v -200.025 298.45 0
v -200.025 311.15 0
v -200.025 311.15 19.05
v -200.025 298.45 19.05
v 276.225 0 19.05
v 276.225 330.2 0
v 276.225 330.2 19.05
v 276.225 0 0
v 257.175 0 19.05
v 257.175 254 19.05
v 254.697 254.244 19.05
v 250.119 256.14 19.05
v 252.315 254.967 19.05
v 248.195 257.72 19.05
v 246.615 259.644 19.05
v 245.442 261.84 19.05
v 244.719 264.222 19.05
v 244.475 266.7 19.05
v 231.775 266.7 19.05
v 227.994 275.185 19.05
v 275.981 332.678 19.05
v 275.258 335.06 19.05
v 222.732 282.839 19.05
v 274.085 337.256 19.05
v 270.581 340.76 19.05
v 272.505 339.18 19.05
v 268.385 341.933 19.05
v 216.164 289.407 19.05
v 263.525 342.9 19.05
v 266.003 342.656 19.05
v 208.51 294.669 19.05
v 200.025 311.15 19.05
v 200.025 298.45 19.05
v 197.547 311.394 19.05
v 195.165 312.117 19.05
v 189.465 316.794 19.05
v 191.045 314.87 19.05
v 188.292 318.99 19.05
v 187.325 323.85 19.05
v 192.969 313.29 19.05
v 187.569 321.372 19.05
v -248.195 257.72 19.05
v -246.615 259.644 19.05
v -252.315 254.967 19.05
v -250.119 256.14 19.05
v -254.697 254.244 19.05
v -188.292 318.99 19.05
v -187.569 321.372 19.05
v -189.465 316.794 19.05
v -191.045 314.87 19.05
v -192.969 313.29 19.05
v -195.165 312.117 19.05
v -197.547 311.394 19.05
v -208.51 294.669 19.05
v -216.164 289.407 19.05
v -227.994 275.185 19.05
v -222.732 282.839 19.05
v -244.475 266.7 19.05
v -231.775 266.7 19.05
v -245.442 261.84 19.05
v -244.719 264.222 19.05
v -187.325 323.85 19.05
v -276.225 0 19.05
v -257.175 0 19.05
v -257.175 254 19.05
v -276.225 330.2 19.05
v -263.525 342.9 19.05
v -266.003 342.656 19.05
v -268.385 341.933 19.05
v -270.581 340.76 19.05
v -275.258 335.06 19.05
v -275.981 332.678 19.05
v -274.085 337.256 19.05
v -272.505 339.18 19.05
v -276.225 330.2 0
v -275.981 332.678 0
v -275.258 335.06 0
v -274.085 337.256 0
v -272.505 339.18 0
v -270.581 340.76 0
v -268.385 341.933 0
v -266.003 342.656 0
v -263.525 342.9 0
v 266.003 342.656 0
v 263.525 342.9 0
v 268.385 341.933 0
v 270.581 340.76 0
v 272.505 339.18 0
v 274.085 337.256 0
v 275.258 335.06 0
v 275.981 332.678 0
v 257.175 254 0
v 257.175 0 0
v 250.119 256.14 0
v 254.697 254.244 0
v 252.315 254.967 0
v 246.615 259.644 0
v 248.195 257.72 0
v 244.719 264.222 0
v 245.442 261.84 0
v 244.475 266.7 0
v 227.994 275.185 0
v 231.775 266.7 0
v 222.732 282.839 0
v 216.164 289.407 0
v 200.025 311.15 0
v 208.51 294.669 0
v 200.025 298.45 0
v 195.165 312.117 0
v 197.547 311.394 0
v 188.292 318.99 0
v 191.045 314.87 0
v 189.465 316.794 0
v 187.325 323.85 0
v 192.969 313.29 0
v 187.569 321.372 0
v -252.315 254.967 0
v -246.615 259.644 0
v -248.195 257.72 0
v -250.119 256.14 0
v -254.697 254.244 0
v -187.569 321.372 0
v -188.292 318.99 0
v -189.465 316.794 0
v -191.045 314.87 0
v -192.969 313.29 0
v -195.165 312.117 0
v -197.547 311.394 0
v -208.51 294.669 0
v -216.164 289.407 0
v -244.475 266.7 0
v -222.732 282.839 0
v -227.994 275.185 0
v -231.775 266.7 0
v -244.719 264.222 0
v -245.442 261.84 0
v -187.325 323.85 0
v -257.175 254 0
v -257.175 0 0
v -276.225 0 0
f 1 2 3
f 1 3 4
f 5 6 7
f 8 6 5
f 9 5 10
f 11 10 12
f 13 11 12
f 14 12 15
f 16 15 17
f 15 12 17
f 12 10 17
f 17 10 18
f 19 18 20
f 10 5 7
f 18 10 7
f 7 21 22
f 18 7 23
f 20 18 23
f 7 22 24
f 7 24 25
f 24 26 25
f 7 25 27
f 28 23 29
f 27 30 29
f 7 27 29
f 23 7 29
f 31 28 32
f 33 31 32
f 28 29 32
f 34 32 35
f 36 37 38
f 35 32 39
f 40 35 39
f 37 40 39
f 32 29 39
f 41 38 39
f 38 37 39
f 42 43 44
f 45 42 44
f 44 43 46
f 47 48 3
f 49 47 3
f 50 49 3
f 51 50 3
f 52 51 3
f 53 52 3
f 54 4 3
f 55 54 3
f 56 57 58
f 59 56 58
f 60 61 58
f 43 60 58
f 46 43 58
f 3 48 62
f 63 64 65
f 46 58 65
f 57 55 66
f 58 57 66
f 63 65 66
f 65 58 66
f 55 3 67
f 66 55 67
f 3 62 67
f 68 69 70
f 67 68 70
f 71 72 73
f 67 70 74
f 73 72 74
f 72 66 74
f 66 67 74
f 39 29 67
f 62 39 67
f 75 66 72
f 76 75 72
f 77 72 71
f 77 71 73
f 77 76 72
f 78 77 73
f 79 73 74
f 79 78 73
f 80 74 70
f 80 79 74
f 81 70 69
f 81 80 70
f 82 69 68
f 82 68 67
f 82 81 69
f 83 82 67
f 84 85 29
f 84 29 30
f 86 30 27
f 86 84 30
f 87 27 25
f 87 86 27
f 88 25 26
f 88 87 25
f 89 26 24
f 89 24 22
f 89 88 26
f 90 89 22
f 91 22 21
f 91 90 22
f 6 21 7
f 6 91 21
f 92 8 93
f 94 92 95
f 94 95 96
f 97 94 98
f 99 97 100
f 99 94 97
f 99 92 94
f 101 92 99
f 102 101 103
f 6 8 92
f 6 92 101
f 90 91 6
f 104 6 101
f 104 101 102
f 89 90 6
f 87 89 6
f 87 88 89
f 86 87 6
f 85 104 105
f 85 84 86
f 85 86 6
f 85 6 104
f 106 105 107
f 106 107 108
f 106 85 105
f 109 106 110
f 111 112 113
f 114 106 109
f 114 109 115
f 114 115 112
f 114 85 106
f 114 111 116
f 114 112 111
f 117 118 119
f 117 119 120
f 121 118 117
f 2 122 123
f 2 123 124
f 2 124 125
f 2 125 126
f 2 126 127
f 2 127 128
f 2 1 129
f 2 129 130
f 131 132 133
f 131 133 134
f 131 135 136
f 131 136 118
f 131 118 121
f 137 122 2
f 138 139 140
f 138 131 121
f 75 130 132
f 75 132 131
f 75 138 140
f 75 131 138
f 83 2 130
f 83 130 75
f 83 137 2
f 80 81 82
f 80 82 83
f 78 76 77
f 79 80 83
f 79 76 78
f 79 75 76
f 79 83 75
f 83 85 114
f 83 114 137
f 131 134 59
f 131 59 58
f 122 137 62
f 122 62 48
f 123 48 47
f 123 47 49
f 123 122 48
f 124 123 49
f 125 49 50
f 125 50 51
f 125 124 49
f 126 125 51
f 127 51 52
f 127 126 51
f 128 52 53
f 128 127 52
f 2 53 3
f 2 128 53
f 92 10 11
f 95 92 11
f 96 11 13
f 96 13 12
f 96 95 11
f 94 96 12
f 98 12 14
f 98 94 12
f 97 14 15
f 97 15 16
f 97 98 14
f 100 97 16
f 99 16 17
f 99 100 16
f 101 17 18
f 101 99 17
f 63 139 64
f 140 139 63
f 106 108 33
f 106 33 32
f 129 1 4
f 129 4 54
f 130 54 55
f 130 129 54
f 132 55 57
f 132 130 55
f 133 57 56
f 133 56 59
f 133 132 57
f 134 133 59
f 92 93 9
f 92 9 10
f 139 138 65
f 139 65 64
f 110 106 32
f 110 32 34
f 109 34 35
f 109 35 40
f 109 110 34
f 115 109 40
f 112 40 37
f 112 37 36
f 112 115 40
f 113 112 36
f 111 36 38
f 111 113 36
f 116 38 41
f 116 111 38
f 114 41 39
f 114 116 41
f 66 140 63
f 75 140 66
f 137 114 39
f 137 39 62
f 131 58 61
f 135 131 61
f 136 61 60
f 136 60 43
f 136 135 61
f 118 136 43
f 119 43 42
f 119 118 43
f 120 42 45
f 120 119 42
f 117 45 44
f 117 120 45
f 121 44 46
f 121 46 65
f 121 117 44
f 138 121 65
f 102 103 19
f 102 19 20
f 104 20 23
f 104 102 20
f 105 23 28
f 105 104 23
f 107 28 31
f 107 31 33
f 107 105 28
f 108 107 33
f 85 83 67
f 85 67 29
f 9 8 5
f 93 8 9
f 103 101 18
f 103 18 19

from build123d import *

# Parameters (mm, degrees)
BOSS_EXTRUDE1_DEPTH = 19.05


with BuildPart() as part:
    # Sketch1 → Boss-Extrude1 (new body)
    with BuildSketch(Plane.XY):
        with BuildLine():
            Line((276.225, 0), (257.175, 0))
            Line((257.175, 0), (257.175, 76.2))
            Line((257.175, 76.2), (257.175, 165.1))
            Line((257.175, 165.1), (257.175, 254))
            ThreePointArc((257.175, 254), (248.194743879, 257.719743879), (244.475, 266.7))
            Line((244.475, 266.7), (231.775, 266.7))
            ThreePointArc((231.775, 266.7), (219.598293765, 286.273293765), (200.025, 298.45))
            Line((200.025, 298.45), (200.025, 311.15))
            ThreePointArc((200.025, 311.15), (191.044743879, 314.869743879), (187.325, 323.85))
            Line((187.325, 323.85), (-187.325, 323.85))
            ThreePointArc((-187.325, 323.85), (-191.044743879, 314.869743879), (-200.025, 311.15))
            Line((-200.025, 311.15), (-200.025, 298.45))
            ThreePointArc((-200.025, 298.45), (-219.598293765, 286.273293765), (-231.775, 266.7))
            Line((-231.775, 266.7), (-244.475, 266.7))
            ThreePointArc((-244.475, 266.7), (-248.194743879, 257.719743879), (-257.175, 254))
            Line((-257.175, 254), (-257.175, 165.1))
            Line((-257.175, 165.1), (-257.175, 76.2))
            Line((-257.175, 76.2), (-257.175, 0))
            Line((-257.175, 0), (-276.225, 0))
            Line((-276.225, 0), (-276.225, 330.2))
            ThreePointArc((-276.225, 330.2), (-272.505256121, 339.180256121), (-263.525, 342.9))
            Line((-263.525, 342.9), (263.525, 342.9))
            ThreePointArc((263.525, 342.9), (272.505256121, 339.180256121), (276.225, 330.2))
            Line((276.225, 330.2), (276.225, 0))
        make_face()
    extrude(amount=BOSS_EXTRUDE1_DEPTH)


solid = part.part
